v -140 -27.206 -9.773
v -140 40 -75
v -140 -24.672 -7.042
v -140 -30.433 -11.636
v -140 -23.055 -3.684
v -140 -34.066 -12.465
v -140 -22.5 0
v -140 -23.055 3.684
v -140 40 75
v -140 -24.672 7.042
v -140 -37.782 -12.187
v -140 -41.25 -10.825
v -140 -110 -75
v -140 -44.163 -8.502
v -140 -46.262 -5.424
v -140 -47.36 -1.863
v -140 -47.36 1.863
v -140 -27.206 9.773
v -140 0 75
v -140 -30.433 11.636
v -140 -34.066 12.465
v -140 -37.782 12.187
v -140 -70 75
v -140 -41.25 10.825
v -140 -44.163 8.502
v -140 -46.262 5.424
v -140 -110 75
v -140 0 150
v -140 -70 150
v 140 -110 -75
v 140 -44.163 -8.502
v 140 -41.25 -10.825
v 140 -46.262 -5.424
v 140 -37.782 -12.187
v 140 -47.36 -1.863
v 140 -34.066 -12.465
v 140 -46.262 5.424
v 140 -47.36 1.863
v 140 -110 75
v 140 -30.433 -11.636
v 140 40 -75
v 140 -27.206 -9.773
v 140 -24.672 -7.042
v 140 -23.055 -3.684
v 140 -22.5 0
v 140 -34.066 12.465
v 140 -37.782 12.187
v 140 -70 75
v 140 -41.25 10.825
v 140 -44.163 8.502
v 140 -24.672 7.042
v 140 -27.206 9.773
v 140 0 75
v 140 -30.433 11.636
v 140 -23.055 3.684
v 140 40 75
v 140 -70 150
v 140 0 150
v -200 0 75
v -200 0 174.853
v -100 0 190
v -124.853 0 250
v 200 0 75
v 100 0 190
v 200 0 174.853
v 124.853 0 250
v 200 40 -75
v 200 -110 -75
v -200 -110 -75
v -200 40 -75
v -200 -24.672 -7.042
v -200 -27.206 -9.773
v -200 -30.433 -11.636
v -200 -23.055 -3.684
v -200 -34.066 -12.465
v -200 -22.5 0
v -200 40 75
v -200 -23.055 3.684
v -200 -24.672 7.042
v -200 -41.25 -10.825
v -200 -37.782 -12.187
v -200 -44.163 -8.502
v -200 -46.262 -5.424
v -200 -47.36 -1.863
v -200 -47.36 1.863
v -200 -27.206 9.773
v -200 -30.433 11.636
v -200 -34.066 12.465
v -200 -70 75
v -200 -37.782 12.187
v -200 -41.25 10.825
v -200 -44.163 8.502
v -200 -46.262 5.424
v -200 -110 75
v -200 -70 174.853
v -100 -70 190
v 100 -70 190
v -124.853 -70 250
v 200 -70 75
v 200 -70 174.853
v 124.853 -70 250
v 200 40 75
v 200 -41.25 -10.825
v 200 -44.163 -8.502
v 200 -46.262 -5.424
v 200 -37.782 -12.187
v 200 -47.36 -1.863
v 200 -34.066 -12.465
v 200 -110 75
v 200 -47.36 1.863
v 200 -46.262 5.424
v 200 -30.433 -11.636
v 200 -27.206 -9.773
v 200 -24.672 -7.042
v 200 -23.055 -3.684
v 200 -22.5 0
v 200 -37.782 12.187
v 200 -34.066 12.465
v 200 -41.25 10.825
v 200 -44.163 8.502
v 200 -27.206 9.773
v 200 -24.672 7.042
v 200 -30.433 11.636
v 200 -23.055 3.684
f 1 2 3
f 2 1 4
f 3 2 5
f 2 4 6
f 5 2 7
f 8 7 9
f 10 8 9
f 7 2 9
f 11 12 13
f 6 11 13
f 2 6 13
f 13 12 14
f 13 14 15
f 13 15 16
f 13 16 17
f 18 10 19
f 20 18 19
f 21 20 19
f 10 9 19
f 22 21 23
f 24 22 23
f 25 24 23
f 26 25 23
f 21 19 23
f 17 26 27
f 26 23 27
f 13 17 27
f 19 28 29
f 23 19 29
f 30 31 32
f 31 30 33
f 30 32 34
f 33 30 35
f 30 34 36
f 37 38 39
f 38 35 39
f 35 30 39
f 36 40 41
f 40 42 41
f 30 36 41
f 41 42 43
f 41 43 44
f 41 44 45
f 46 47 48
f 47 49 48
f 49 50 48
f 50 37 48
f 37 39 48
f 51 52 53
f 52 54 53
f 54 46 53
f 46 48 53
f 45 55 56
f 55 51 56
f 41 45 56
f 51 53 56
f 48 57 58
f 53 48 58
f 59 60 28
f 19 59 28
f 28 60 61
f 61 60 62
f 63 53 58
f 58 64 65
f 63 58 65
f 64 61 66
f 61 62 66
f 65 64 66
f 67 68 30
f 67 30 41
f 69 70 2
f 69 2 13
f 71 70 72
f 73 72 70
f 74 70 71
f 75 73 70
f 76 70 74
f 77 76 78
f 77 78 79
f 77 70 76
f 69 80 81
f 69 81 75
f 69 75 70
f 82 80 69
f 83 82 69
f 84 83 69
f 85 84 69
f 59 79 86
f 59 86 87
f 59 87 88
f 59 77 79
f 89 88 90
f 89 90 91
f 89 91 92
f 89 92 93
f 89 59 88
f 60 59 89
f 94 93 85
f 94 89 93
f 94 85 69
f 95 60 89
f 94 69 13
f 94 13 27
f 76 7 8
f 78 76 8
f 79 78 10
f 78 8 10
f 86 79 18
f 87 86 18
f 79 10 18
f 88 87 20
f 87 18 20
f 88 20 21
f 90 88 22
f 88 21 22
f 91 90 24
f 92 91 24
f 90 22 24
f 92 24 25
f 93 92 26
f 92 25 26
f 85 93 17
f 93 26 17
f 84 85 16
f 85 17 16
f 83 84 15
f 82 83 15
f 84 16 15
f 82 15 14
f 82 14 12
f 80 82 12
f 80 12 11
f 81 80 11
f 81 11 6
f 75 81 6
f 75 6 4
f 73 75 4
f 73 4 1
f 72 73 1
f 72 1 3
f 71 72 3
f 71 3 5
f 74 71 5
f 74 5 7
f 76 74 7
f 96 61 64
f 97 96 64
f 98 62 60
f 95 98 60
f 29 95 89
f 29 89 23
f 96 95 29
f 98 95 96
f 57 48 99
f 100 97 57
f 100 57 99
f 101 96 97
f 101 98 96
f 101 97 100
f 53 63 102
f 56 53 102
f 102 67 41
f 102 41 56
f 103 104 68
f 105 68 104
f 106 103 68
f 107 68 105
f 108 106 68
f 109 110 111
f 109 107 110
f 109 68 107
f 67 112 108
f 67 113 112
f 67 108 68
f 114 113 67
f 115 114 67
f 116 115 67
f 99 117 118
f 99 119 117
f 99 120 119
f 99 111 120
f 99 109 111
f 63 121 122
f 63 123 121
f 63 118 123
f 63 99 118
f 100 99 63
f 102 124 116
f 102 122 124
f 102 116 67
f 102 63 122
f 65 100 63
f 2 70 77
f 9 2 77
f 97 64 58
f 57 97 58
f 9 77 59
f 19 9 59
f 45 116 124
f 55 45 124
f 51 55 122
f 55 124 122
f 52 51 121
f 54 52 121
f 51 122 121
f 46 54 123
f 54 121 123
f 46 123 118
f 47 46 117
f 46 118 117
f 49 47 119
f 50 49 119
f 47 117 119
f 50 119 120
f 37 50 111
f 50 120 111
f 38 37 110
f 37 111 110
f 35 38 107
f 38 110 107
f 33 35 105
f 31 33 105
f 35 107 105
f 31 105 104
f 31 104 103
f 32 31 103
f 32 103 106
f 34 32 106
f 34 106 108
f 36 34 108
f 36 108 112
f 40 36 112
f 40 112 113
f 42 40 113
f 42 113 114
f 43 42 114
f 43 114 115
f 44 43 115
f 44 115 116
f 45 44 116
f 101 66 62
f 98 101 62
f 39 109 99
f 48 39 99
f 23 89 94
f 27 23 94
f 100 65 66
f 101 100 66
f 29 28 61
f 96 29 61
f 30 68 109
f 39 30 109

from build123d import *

# Parameters (mm, degrees)
F1_DEPTH = 70
F2_W     = 150
F2_H     = 150
F3_DEPTH = 60
F4_W     = 150
F4_H     = 150
F5_DEPTH = 60
F6_R     = 12.5
F7_DEPTH = 400.001


with BuildPart() as f1:
    # F0 (on Front) → F1 (new body)
    with BuildSketch(Plane.XZ):
        Polygon((-200, 0), (-140, 0), (-140, 150), (-100, 190), (100, 190), (140, 150), (140, 0), (200, 0), (200, 174.852814), (124.852814, 250), (-124.852814, 250), (-200, 174.852814), align=None)
    extrude(amount=F1_DEPTH)

    # F2 (on face) → F3 (join, through all)
    with BuildSketch(Plane.YZ.offset(200)):
        with Locations((-35, 0)):
            Rectangle(F2_W, F2_H)
    extrude(amount=-F3_DEPTH)

    # F4 (on face) → F5 (join, through all)
    with BuildSketch(Plane(origin=(-200, 0, 0), x_dir=(0, -1, 0), z_dir=(-1, 0, 0))):
        with Locations((35, 0)):
            Rectangle(F4_W, F4_H)
    extrude(amount=-F5_DEPTH)

    # F6 (on face) → F7 (cut, through all)
    with BuildSketch(Plane.YZ.offset(200)):
        with Locations((-35, 0)):
            Circle(F6_R)
    extrude(amount=-F7_DEPTH, mode=Mode.SUBTRACT)


solid = f1.part
